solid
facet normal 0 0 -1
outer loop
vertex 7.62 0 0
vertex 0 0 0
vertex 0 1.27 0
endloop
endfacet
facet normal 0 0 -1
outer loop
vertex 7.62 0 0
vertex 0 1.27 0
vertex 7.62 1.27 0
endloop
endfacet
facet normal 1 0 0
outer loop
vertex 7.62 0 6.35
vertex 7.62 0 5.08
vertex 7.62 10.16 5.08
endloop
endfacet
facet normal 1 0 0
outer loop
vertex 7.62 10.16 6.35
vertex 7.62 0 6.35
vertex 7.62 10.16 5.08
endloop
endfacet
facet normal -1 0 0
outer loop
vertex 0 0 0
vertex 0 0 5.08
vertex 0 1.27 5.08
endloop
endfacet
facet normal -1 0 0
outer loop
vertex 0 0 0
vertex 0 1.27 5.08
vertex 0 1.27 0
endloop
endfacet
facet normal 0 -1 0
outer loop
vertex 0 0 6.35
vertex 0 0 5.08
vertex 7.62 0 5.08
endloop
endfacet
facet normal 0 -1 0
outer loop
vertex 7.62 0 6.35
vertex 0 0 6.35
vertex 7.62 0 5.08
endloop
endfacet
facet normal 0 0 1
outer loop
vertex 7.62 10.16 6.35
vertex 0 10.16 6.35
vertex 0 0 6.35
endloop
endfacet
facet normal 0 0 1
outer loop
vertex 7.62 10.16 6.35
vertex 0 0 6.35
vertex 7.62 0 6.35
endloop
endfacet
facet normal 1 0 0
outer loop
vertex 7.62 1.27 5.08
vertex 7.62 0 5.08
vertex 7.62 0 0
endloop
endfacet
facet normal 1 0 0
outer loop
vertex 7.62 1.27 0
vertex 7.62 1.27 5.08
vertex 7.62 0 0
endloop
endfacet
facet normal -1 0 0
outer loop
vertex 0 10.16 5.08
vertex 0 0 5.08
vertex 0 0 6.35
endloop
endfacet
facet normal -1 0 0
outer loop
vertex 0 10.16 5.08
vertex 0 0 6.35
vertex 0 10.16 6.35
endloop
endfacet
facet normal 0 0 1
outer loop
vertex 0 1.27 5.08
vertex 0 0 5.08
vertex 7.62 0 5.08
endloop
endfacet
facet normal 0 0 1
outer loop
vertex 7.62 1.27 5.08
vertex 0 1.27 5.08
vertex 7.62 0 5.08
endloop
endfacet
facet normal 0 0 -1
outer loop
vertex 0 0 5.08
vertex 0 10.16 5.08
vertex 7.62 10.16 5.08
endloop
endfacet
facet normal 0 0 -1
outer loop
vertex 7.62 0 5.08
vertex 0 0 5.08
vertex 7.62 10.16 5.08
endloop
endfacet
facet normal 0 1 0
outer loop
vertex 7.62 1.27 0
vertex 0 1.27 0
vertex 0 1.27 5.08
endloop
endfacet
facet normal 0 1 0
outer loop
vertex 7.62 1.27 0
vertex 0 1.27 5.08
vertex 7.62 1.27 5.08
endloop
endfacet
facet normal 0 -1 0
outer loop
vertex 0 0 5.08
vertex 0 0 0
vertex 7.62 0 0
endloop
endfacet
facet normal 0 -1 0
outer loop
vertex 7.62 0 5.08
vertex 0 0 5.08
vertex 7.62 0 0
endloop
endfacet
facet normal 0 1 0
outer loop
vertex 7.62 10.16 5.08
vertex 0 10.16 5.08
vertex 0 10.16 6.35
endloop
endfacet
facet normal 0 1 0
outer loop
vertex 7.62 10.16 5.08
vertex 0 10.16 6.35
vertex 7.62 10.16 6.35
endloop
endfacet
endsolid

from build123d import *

# Parameters (mm, degrees)
SKETCH1_W           = 7.62
SKETCH1_H           = 5.08
BOSS_EXTRUDE1_DEPTH = 1.27
SKETCH2_W           = 7.62
SKETCH2_H           = 10.16
BOSS_EXTRUDE2_DEPTH = 1.27


with BuildPart() as part:
    # Sketch1 → Boss-Extrude1 (new body)
    with BuildSketch(Plane(origin=(0, 0, 0), x_dir=(1, 0, 0), z_dir=(0, 1, 0))):
        with Locations((3.81, -2.54)):
            Rectangle(SKETCH1_W, SKETCH1_H)
    extrude(amount=BOSS_EXTRUDE1_DEPTH)


with BuildPart() as body_2:
    # Sketch2 → Boss-Extrude2 (new body)
    with BuildSketch(Plane.XY.offset(5.08)):
        with Locations((3.81, 5.08)):
            Rectangle(SKETCH2_W, SKETCH2_H)
    extrude(amount=BOSS_EXTRUDE2_DEPTH)


solid = Compound([part.part, body_2.part])
